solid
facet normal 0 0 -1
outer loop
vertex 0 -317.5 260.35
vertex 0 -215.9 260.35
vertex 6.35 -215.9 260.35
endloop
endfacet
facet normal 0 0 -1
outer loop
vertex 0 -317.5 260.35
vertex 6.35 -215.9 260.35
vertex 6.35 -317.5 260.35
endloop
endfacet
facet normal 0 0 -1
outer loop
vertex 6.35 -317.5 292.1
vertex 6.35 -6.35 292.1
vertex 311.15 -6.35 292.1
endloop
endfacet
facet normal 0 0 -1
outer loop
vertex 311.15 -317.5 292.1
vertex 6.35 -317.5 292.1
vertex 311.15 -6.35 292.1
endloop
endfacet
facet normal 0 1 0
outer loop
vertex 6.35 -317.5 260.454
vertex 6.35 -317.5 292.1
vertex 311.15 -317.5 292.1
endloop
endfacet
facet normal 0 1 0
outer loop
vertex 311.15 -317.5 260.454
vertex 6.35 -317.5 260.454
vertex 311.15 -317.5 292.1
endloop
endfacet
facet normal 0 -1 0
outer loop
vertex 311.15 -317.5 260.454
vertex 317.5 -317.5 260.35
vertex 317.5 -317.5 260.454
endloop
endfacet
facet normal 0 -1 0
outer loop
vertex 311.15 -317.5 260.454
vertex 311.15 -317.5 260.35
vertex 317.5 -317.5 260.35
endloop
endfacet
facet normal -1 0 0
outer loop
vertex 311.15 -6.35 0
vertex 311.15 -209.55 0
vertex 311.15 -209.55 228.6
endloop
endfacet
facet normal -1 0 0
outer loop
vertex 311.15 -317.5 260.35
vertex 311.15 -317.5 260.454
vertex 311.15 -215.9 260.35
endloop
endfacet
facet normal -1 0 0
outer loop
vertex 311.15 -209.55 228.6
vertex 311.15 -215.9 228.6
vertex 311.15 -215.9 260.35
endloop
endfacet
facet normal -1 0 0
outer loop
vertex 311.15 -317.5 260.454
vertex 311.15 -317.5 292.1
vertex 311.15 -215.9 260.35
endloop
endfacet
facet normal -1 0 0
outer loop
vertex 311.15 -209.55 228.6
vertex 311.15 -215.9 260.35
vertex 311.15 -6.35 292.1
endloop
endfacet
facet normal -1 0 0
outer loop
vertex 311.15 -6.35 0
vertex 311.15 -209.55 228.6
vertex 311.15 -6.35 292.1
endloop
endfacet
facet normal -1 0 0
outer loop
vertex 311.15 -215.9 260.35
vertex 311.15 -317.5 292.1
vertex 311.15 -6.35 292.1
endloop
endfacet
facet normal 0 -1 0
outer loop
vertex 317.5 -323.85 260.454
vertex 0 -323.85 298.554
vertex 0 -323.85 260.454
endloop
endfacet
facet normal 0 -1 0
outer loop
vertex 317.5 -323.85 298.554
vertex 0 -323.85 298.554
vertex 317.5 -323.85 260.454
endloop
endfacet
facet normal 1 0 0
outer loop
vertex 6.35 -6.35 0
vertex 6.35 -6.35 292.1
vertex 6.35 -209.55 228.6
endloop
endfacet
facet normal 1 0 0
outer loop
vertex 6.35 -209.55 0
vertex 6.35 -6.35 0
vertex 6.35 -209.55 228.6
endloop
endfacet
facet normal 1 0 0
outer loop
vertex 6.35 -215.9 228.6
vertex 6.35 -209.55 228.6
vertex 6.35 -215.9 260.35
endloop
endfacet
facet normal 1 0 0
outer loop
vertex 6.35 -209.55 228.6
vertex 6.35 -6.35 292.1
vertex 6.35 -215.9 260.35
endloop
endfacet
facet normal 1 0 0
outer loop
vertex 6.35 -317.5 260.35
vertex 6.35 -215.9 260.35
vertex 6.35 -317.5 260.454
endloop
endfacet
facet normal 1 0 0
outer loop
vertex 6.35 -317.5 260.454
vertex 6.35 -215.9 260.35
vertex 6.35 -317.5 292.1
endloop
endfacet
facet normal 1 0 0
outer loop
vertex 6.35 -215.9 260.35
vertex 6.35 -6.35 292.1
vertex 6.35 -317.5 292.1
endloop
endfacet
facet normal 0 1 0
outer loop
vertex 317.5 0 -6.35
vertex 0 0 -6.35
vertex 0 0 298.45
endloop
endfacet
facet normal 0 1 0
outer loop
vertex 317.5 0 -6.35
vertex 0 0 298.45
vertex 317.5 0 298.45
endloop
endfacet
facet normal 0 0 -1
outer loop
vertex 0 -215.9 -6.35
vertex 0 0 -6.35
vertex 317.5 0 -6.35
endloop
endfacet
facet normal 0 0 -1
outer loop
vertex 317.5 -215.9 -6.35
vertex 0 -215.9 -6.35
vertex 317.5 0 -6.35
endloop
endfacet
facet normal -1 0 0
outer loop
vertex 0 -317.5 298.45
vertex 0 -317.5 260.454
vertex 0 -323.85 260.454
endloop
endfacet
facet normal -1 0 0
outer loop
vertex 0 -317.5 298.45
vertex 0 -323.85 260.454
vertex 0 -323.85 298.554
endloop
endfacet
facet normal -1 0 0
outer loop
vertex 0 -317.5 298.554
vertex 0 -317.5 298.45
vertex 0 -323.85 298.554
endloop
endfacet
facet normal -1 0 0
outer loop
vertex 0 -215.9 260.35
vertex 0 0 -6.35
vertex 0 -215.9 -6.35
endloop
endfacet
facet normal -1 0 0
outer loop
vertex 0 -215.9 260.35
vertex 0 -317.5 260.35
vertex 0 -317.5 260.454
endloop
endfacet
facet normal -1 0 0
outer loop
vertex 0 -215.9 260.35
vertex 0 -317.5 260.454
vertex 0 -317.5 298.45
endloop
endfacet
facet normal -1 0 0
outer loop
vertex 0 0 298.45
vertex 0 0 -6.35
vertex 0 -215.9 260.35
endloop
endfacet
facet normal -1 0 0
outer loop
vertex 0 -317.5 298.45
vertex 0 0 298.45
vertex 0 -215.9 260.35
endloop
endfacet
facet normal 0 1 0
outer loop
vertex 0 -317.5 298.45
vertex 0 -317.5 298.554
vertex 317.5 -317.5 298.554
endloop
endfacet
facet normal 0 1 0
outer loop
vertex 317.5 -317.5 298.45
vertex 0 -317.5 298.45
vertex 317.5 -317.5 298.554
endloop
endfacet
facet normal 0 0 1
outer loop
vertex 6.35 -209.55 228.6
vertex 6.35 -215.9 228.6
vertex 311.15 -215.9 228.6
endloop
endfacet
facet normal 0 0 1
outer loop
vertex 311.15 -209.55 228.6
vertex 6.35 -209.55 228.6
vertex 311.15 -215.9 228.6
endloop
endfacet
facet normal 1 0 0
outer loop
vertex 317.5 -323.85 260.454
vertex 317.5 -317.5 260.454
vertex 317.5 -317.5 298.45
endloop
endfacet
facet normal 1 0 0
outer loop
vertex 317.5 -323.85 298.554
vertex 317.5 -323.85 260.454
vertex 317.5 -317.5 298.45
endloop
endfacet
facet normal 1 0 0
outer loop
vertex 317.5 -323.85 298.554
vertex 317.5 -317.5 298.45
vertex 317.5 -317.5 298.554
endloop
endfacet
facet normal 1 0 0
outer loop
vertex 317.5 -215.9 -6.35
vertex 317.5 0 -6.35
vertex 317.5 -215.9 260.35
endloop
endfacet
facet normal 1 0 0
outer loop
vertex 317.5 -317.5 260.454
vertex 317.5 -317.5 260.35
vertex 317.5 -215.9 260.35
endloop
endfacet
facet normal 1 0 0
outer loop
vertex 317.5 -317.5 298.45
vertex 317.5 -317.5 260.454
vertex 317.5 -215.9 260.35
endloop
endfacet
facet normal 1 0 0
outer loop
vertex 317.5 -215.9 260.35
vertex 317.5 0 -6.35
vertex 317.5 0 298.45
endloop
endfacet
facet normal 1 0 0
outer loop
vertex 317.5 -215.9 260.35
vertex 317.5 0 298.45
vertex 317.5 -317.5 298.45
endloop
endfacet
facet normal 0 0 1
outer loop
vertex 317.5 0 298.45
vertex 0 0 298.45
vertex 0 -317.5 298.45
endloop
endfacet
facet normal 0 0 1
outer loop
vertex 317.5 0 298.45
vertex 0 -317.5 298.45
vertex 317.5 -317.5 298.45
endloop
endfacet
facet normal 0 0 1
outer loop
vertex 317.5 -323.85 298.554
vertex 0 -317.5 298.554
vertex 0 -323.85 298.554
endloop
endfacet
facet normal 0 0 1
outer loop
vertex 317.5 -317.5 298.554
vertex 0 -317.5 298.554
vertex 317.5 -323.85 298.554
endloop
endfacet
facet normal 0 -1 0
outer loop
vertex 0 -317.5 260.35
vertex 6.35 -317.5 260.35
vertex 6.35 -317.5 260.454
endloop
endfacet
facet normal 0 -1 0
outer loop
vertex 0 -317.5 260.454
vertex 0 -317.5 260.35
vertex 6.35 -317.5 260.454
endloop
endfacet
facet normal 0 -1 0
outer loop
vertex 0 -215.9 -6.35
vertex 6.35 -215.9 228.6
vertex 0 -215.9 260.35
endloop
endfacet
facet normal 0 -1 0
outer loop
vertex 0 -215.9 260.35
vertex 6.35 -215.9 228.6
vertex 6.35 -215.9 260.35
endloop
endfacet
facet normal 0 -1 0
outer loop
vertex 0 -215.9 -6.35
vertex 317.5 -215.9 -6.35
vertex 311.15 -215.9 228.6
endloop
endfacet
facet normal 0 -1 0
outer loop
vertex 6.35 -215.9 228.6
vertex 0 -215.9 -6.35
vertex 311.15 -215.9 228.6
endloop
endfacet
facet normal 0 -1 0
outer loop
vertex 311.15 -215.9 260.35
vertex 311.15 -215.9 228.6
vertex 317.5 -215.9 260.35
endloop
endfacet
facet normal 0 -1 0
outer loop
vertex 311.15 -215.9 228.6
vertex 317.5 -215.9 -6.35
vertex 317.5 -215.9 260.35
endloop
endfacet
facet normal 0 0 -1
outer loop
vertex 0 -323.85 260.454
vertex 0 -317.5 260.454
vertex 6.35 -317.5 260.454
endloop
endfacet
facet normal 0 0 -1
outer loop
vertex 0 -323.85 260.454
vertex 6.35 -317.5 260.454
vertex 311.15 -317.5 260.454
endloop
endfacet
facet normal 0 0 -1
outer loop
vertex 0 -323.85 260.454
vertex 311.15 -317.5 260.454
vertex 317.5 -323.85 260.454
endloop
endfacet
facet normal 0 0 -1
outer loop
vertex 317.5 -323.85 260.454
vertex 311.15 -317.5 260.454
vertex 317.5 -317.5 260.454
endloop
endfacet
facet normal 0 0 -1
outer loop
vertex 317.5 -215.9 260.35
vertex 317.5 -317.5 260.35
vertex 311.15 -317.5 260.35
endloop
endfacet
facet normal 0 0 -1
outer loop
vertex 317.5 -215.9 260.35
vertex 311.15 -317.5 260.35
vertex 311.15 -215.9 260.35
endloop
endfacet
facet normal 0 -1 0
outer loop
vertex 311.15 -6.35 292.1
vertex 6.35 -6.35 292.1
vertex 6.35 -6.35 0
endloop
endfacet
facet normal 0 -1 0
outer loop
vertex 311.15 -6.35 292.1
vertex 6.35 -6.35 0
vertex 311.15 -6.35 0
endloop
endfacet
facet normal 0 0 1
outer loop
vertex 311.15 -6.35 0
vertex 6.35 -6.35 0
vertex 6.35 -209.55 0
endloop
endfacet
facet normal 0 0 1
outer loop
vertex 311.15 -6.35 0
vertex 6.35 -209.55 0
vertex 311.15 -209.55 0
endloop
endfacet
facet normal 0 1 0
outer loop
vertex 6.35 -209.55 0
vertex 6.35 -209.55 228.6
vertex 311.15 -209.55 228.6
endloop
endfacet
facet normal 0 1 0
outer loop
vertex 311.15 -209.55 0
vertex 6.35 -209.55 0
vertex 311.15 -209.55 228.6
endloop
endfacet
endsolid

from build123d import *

# Parameters (mm, degrees)
F0_W      = 317.5
F0_H      = 215.9
F1_DEPTH  = 6.35
F2_W      = 317.5
F2_H      = 292.1
F3_DEPTH  = 6.35
F4_W      = 215.9
F4_H      = 292.1
F5_DEPTH  = 6.35
F7_W      = 215.9
F7_H      = 292.1
F8_DEPTH  = 6.35
F10_W     = 317.5
F10_H     = 317.5
F11_DEPTH = 6.35
F14_W     = 317.5
F14_H     = 228.6
F15_DEPTH = 6.35
F16_W     = 101.6
F16_H     = 38.1
F17_DEPTH = 6.35
F18_W     = 101.6
F18_H     = 38.1
F19_DEPTH = 6.35
F20_W     = 317.5
F20_H     = 38.1
F21_DEPTH = 6.35


with BuildPart() as f1:
    # F0 (on Top) → F1 (new body)
    with BuildSketch(Plane.XY):
        with Locations((158.75, -107.95)):
            Rectangle(F0_W, F0_H)
    extrude(amount=-F1_DEPTH)

    # F2 (on Front) → F3 (join)
    with BuildSketch(Plane.XZ):
        with Locations((158.75, 146.05)):
            Rectangle(F2_W, F2_H)
    extrude(amount=F3_DEPTH)

    # F4 (on Right) → F5 (join)
    with BuildSketch(Plane.YZ):
        with Locations((-107.95, 146.05)):
            Rectangle(F4_W, F4_H)
    extrude(amount=F5_DEPTH)

    # F7 (on offset) → F8 (join)
    with BuildSketch(Plane.YZ.offset(317.5)):
        with Locations((-107.95, 146.05)):
            Rectangle(F7_W, F7_H)
    extrude(amount=-F8_DEPTH)

    # F10 (on offset) → F11 (join)
    with BuildSketch(Plane.XY.offset(292.1)):
        with Locations((158.75, -158.75)):
            Rectangle(F10_W, F10_H)
    extrude(amount=F11_DEPTH)

    # F14 (on offset) → F15 (join)
    with BuildSketch(Plane.XZ.offset(215.9)):
        with Locations((158.75, 114.3)):
            Rectangle(F14_W, F14_H)
    extrude(amount=-F15_DEPTH)

    # F16 (on face) → F17 (join)
    with BuildSketch(Plane.YZ.offset(317.5)):
        with Locations((-266.7, 279.4)):
            Rectangle(F16_W, F16_H)
    extrude(amount=-F17_DEPTH)

    # F18 (on face) → F19 (join)
    with BuildSketch(Plane(origin=(0, 0, 0), x_dir=(0, -1, 0), z_dir=(-1, 0, 0))):
        with Locations((266.7, 279.4)):
            Rectangle(F18_W, F18_H)
    extrude(amount=-F19_DEPTH)

    # F20 (on offset) → F21 (join)
    with BuildSketch(Plane.XZ.offset(317.5)):
        with Locations((158.75, 279.5041836309)):
            Rectangle(F20_W, F20_H)
    extrude(amount=F21_DEPTH)


solid = f1.part
